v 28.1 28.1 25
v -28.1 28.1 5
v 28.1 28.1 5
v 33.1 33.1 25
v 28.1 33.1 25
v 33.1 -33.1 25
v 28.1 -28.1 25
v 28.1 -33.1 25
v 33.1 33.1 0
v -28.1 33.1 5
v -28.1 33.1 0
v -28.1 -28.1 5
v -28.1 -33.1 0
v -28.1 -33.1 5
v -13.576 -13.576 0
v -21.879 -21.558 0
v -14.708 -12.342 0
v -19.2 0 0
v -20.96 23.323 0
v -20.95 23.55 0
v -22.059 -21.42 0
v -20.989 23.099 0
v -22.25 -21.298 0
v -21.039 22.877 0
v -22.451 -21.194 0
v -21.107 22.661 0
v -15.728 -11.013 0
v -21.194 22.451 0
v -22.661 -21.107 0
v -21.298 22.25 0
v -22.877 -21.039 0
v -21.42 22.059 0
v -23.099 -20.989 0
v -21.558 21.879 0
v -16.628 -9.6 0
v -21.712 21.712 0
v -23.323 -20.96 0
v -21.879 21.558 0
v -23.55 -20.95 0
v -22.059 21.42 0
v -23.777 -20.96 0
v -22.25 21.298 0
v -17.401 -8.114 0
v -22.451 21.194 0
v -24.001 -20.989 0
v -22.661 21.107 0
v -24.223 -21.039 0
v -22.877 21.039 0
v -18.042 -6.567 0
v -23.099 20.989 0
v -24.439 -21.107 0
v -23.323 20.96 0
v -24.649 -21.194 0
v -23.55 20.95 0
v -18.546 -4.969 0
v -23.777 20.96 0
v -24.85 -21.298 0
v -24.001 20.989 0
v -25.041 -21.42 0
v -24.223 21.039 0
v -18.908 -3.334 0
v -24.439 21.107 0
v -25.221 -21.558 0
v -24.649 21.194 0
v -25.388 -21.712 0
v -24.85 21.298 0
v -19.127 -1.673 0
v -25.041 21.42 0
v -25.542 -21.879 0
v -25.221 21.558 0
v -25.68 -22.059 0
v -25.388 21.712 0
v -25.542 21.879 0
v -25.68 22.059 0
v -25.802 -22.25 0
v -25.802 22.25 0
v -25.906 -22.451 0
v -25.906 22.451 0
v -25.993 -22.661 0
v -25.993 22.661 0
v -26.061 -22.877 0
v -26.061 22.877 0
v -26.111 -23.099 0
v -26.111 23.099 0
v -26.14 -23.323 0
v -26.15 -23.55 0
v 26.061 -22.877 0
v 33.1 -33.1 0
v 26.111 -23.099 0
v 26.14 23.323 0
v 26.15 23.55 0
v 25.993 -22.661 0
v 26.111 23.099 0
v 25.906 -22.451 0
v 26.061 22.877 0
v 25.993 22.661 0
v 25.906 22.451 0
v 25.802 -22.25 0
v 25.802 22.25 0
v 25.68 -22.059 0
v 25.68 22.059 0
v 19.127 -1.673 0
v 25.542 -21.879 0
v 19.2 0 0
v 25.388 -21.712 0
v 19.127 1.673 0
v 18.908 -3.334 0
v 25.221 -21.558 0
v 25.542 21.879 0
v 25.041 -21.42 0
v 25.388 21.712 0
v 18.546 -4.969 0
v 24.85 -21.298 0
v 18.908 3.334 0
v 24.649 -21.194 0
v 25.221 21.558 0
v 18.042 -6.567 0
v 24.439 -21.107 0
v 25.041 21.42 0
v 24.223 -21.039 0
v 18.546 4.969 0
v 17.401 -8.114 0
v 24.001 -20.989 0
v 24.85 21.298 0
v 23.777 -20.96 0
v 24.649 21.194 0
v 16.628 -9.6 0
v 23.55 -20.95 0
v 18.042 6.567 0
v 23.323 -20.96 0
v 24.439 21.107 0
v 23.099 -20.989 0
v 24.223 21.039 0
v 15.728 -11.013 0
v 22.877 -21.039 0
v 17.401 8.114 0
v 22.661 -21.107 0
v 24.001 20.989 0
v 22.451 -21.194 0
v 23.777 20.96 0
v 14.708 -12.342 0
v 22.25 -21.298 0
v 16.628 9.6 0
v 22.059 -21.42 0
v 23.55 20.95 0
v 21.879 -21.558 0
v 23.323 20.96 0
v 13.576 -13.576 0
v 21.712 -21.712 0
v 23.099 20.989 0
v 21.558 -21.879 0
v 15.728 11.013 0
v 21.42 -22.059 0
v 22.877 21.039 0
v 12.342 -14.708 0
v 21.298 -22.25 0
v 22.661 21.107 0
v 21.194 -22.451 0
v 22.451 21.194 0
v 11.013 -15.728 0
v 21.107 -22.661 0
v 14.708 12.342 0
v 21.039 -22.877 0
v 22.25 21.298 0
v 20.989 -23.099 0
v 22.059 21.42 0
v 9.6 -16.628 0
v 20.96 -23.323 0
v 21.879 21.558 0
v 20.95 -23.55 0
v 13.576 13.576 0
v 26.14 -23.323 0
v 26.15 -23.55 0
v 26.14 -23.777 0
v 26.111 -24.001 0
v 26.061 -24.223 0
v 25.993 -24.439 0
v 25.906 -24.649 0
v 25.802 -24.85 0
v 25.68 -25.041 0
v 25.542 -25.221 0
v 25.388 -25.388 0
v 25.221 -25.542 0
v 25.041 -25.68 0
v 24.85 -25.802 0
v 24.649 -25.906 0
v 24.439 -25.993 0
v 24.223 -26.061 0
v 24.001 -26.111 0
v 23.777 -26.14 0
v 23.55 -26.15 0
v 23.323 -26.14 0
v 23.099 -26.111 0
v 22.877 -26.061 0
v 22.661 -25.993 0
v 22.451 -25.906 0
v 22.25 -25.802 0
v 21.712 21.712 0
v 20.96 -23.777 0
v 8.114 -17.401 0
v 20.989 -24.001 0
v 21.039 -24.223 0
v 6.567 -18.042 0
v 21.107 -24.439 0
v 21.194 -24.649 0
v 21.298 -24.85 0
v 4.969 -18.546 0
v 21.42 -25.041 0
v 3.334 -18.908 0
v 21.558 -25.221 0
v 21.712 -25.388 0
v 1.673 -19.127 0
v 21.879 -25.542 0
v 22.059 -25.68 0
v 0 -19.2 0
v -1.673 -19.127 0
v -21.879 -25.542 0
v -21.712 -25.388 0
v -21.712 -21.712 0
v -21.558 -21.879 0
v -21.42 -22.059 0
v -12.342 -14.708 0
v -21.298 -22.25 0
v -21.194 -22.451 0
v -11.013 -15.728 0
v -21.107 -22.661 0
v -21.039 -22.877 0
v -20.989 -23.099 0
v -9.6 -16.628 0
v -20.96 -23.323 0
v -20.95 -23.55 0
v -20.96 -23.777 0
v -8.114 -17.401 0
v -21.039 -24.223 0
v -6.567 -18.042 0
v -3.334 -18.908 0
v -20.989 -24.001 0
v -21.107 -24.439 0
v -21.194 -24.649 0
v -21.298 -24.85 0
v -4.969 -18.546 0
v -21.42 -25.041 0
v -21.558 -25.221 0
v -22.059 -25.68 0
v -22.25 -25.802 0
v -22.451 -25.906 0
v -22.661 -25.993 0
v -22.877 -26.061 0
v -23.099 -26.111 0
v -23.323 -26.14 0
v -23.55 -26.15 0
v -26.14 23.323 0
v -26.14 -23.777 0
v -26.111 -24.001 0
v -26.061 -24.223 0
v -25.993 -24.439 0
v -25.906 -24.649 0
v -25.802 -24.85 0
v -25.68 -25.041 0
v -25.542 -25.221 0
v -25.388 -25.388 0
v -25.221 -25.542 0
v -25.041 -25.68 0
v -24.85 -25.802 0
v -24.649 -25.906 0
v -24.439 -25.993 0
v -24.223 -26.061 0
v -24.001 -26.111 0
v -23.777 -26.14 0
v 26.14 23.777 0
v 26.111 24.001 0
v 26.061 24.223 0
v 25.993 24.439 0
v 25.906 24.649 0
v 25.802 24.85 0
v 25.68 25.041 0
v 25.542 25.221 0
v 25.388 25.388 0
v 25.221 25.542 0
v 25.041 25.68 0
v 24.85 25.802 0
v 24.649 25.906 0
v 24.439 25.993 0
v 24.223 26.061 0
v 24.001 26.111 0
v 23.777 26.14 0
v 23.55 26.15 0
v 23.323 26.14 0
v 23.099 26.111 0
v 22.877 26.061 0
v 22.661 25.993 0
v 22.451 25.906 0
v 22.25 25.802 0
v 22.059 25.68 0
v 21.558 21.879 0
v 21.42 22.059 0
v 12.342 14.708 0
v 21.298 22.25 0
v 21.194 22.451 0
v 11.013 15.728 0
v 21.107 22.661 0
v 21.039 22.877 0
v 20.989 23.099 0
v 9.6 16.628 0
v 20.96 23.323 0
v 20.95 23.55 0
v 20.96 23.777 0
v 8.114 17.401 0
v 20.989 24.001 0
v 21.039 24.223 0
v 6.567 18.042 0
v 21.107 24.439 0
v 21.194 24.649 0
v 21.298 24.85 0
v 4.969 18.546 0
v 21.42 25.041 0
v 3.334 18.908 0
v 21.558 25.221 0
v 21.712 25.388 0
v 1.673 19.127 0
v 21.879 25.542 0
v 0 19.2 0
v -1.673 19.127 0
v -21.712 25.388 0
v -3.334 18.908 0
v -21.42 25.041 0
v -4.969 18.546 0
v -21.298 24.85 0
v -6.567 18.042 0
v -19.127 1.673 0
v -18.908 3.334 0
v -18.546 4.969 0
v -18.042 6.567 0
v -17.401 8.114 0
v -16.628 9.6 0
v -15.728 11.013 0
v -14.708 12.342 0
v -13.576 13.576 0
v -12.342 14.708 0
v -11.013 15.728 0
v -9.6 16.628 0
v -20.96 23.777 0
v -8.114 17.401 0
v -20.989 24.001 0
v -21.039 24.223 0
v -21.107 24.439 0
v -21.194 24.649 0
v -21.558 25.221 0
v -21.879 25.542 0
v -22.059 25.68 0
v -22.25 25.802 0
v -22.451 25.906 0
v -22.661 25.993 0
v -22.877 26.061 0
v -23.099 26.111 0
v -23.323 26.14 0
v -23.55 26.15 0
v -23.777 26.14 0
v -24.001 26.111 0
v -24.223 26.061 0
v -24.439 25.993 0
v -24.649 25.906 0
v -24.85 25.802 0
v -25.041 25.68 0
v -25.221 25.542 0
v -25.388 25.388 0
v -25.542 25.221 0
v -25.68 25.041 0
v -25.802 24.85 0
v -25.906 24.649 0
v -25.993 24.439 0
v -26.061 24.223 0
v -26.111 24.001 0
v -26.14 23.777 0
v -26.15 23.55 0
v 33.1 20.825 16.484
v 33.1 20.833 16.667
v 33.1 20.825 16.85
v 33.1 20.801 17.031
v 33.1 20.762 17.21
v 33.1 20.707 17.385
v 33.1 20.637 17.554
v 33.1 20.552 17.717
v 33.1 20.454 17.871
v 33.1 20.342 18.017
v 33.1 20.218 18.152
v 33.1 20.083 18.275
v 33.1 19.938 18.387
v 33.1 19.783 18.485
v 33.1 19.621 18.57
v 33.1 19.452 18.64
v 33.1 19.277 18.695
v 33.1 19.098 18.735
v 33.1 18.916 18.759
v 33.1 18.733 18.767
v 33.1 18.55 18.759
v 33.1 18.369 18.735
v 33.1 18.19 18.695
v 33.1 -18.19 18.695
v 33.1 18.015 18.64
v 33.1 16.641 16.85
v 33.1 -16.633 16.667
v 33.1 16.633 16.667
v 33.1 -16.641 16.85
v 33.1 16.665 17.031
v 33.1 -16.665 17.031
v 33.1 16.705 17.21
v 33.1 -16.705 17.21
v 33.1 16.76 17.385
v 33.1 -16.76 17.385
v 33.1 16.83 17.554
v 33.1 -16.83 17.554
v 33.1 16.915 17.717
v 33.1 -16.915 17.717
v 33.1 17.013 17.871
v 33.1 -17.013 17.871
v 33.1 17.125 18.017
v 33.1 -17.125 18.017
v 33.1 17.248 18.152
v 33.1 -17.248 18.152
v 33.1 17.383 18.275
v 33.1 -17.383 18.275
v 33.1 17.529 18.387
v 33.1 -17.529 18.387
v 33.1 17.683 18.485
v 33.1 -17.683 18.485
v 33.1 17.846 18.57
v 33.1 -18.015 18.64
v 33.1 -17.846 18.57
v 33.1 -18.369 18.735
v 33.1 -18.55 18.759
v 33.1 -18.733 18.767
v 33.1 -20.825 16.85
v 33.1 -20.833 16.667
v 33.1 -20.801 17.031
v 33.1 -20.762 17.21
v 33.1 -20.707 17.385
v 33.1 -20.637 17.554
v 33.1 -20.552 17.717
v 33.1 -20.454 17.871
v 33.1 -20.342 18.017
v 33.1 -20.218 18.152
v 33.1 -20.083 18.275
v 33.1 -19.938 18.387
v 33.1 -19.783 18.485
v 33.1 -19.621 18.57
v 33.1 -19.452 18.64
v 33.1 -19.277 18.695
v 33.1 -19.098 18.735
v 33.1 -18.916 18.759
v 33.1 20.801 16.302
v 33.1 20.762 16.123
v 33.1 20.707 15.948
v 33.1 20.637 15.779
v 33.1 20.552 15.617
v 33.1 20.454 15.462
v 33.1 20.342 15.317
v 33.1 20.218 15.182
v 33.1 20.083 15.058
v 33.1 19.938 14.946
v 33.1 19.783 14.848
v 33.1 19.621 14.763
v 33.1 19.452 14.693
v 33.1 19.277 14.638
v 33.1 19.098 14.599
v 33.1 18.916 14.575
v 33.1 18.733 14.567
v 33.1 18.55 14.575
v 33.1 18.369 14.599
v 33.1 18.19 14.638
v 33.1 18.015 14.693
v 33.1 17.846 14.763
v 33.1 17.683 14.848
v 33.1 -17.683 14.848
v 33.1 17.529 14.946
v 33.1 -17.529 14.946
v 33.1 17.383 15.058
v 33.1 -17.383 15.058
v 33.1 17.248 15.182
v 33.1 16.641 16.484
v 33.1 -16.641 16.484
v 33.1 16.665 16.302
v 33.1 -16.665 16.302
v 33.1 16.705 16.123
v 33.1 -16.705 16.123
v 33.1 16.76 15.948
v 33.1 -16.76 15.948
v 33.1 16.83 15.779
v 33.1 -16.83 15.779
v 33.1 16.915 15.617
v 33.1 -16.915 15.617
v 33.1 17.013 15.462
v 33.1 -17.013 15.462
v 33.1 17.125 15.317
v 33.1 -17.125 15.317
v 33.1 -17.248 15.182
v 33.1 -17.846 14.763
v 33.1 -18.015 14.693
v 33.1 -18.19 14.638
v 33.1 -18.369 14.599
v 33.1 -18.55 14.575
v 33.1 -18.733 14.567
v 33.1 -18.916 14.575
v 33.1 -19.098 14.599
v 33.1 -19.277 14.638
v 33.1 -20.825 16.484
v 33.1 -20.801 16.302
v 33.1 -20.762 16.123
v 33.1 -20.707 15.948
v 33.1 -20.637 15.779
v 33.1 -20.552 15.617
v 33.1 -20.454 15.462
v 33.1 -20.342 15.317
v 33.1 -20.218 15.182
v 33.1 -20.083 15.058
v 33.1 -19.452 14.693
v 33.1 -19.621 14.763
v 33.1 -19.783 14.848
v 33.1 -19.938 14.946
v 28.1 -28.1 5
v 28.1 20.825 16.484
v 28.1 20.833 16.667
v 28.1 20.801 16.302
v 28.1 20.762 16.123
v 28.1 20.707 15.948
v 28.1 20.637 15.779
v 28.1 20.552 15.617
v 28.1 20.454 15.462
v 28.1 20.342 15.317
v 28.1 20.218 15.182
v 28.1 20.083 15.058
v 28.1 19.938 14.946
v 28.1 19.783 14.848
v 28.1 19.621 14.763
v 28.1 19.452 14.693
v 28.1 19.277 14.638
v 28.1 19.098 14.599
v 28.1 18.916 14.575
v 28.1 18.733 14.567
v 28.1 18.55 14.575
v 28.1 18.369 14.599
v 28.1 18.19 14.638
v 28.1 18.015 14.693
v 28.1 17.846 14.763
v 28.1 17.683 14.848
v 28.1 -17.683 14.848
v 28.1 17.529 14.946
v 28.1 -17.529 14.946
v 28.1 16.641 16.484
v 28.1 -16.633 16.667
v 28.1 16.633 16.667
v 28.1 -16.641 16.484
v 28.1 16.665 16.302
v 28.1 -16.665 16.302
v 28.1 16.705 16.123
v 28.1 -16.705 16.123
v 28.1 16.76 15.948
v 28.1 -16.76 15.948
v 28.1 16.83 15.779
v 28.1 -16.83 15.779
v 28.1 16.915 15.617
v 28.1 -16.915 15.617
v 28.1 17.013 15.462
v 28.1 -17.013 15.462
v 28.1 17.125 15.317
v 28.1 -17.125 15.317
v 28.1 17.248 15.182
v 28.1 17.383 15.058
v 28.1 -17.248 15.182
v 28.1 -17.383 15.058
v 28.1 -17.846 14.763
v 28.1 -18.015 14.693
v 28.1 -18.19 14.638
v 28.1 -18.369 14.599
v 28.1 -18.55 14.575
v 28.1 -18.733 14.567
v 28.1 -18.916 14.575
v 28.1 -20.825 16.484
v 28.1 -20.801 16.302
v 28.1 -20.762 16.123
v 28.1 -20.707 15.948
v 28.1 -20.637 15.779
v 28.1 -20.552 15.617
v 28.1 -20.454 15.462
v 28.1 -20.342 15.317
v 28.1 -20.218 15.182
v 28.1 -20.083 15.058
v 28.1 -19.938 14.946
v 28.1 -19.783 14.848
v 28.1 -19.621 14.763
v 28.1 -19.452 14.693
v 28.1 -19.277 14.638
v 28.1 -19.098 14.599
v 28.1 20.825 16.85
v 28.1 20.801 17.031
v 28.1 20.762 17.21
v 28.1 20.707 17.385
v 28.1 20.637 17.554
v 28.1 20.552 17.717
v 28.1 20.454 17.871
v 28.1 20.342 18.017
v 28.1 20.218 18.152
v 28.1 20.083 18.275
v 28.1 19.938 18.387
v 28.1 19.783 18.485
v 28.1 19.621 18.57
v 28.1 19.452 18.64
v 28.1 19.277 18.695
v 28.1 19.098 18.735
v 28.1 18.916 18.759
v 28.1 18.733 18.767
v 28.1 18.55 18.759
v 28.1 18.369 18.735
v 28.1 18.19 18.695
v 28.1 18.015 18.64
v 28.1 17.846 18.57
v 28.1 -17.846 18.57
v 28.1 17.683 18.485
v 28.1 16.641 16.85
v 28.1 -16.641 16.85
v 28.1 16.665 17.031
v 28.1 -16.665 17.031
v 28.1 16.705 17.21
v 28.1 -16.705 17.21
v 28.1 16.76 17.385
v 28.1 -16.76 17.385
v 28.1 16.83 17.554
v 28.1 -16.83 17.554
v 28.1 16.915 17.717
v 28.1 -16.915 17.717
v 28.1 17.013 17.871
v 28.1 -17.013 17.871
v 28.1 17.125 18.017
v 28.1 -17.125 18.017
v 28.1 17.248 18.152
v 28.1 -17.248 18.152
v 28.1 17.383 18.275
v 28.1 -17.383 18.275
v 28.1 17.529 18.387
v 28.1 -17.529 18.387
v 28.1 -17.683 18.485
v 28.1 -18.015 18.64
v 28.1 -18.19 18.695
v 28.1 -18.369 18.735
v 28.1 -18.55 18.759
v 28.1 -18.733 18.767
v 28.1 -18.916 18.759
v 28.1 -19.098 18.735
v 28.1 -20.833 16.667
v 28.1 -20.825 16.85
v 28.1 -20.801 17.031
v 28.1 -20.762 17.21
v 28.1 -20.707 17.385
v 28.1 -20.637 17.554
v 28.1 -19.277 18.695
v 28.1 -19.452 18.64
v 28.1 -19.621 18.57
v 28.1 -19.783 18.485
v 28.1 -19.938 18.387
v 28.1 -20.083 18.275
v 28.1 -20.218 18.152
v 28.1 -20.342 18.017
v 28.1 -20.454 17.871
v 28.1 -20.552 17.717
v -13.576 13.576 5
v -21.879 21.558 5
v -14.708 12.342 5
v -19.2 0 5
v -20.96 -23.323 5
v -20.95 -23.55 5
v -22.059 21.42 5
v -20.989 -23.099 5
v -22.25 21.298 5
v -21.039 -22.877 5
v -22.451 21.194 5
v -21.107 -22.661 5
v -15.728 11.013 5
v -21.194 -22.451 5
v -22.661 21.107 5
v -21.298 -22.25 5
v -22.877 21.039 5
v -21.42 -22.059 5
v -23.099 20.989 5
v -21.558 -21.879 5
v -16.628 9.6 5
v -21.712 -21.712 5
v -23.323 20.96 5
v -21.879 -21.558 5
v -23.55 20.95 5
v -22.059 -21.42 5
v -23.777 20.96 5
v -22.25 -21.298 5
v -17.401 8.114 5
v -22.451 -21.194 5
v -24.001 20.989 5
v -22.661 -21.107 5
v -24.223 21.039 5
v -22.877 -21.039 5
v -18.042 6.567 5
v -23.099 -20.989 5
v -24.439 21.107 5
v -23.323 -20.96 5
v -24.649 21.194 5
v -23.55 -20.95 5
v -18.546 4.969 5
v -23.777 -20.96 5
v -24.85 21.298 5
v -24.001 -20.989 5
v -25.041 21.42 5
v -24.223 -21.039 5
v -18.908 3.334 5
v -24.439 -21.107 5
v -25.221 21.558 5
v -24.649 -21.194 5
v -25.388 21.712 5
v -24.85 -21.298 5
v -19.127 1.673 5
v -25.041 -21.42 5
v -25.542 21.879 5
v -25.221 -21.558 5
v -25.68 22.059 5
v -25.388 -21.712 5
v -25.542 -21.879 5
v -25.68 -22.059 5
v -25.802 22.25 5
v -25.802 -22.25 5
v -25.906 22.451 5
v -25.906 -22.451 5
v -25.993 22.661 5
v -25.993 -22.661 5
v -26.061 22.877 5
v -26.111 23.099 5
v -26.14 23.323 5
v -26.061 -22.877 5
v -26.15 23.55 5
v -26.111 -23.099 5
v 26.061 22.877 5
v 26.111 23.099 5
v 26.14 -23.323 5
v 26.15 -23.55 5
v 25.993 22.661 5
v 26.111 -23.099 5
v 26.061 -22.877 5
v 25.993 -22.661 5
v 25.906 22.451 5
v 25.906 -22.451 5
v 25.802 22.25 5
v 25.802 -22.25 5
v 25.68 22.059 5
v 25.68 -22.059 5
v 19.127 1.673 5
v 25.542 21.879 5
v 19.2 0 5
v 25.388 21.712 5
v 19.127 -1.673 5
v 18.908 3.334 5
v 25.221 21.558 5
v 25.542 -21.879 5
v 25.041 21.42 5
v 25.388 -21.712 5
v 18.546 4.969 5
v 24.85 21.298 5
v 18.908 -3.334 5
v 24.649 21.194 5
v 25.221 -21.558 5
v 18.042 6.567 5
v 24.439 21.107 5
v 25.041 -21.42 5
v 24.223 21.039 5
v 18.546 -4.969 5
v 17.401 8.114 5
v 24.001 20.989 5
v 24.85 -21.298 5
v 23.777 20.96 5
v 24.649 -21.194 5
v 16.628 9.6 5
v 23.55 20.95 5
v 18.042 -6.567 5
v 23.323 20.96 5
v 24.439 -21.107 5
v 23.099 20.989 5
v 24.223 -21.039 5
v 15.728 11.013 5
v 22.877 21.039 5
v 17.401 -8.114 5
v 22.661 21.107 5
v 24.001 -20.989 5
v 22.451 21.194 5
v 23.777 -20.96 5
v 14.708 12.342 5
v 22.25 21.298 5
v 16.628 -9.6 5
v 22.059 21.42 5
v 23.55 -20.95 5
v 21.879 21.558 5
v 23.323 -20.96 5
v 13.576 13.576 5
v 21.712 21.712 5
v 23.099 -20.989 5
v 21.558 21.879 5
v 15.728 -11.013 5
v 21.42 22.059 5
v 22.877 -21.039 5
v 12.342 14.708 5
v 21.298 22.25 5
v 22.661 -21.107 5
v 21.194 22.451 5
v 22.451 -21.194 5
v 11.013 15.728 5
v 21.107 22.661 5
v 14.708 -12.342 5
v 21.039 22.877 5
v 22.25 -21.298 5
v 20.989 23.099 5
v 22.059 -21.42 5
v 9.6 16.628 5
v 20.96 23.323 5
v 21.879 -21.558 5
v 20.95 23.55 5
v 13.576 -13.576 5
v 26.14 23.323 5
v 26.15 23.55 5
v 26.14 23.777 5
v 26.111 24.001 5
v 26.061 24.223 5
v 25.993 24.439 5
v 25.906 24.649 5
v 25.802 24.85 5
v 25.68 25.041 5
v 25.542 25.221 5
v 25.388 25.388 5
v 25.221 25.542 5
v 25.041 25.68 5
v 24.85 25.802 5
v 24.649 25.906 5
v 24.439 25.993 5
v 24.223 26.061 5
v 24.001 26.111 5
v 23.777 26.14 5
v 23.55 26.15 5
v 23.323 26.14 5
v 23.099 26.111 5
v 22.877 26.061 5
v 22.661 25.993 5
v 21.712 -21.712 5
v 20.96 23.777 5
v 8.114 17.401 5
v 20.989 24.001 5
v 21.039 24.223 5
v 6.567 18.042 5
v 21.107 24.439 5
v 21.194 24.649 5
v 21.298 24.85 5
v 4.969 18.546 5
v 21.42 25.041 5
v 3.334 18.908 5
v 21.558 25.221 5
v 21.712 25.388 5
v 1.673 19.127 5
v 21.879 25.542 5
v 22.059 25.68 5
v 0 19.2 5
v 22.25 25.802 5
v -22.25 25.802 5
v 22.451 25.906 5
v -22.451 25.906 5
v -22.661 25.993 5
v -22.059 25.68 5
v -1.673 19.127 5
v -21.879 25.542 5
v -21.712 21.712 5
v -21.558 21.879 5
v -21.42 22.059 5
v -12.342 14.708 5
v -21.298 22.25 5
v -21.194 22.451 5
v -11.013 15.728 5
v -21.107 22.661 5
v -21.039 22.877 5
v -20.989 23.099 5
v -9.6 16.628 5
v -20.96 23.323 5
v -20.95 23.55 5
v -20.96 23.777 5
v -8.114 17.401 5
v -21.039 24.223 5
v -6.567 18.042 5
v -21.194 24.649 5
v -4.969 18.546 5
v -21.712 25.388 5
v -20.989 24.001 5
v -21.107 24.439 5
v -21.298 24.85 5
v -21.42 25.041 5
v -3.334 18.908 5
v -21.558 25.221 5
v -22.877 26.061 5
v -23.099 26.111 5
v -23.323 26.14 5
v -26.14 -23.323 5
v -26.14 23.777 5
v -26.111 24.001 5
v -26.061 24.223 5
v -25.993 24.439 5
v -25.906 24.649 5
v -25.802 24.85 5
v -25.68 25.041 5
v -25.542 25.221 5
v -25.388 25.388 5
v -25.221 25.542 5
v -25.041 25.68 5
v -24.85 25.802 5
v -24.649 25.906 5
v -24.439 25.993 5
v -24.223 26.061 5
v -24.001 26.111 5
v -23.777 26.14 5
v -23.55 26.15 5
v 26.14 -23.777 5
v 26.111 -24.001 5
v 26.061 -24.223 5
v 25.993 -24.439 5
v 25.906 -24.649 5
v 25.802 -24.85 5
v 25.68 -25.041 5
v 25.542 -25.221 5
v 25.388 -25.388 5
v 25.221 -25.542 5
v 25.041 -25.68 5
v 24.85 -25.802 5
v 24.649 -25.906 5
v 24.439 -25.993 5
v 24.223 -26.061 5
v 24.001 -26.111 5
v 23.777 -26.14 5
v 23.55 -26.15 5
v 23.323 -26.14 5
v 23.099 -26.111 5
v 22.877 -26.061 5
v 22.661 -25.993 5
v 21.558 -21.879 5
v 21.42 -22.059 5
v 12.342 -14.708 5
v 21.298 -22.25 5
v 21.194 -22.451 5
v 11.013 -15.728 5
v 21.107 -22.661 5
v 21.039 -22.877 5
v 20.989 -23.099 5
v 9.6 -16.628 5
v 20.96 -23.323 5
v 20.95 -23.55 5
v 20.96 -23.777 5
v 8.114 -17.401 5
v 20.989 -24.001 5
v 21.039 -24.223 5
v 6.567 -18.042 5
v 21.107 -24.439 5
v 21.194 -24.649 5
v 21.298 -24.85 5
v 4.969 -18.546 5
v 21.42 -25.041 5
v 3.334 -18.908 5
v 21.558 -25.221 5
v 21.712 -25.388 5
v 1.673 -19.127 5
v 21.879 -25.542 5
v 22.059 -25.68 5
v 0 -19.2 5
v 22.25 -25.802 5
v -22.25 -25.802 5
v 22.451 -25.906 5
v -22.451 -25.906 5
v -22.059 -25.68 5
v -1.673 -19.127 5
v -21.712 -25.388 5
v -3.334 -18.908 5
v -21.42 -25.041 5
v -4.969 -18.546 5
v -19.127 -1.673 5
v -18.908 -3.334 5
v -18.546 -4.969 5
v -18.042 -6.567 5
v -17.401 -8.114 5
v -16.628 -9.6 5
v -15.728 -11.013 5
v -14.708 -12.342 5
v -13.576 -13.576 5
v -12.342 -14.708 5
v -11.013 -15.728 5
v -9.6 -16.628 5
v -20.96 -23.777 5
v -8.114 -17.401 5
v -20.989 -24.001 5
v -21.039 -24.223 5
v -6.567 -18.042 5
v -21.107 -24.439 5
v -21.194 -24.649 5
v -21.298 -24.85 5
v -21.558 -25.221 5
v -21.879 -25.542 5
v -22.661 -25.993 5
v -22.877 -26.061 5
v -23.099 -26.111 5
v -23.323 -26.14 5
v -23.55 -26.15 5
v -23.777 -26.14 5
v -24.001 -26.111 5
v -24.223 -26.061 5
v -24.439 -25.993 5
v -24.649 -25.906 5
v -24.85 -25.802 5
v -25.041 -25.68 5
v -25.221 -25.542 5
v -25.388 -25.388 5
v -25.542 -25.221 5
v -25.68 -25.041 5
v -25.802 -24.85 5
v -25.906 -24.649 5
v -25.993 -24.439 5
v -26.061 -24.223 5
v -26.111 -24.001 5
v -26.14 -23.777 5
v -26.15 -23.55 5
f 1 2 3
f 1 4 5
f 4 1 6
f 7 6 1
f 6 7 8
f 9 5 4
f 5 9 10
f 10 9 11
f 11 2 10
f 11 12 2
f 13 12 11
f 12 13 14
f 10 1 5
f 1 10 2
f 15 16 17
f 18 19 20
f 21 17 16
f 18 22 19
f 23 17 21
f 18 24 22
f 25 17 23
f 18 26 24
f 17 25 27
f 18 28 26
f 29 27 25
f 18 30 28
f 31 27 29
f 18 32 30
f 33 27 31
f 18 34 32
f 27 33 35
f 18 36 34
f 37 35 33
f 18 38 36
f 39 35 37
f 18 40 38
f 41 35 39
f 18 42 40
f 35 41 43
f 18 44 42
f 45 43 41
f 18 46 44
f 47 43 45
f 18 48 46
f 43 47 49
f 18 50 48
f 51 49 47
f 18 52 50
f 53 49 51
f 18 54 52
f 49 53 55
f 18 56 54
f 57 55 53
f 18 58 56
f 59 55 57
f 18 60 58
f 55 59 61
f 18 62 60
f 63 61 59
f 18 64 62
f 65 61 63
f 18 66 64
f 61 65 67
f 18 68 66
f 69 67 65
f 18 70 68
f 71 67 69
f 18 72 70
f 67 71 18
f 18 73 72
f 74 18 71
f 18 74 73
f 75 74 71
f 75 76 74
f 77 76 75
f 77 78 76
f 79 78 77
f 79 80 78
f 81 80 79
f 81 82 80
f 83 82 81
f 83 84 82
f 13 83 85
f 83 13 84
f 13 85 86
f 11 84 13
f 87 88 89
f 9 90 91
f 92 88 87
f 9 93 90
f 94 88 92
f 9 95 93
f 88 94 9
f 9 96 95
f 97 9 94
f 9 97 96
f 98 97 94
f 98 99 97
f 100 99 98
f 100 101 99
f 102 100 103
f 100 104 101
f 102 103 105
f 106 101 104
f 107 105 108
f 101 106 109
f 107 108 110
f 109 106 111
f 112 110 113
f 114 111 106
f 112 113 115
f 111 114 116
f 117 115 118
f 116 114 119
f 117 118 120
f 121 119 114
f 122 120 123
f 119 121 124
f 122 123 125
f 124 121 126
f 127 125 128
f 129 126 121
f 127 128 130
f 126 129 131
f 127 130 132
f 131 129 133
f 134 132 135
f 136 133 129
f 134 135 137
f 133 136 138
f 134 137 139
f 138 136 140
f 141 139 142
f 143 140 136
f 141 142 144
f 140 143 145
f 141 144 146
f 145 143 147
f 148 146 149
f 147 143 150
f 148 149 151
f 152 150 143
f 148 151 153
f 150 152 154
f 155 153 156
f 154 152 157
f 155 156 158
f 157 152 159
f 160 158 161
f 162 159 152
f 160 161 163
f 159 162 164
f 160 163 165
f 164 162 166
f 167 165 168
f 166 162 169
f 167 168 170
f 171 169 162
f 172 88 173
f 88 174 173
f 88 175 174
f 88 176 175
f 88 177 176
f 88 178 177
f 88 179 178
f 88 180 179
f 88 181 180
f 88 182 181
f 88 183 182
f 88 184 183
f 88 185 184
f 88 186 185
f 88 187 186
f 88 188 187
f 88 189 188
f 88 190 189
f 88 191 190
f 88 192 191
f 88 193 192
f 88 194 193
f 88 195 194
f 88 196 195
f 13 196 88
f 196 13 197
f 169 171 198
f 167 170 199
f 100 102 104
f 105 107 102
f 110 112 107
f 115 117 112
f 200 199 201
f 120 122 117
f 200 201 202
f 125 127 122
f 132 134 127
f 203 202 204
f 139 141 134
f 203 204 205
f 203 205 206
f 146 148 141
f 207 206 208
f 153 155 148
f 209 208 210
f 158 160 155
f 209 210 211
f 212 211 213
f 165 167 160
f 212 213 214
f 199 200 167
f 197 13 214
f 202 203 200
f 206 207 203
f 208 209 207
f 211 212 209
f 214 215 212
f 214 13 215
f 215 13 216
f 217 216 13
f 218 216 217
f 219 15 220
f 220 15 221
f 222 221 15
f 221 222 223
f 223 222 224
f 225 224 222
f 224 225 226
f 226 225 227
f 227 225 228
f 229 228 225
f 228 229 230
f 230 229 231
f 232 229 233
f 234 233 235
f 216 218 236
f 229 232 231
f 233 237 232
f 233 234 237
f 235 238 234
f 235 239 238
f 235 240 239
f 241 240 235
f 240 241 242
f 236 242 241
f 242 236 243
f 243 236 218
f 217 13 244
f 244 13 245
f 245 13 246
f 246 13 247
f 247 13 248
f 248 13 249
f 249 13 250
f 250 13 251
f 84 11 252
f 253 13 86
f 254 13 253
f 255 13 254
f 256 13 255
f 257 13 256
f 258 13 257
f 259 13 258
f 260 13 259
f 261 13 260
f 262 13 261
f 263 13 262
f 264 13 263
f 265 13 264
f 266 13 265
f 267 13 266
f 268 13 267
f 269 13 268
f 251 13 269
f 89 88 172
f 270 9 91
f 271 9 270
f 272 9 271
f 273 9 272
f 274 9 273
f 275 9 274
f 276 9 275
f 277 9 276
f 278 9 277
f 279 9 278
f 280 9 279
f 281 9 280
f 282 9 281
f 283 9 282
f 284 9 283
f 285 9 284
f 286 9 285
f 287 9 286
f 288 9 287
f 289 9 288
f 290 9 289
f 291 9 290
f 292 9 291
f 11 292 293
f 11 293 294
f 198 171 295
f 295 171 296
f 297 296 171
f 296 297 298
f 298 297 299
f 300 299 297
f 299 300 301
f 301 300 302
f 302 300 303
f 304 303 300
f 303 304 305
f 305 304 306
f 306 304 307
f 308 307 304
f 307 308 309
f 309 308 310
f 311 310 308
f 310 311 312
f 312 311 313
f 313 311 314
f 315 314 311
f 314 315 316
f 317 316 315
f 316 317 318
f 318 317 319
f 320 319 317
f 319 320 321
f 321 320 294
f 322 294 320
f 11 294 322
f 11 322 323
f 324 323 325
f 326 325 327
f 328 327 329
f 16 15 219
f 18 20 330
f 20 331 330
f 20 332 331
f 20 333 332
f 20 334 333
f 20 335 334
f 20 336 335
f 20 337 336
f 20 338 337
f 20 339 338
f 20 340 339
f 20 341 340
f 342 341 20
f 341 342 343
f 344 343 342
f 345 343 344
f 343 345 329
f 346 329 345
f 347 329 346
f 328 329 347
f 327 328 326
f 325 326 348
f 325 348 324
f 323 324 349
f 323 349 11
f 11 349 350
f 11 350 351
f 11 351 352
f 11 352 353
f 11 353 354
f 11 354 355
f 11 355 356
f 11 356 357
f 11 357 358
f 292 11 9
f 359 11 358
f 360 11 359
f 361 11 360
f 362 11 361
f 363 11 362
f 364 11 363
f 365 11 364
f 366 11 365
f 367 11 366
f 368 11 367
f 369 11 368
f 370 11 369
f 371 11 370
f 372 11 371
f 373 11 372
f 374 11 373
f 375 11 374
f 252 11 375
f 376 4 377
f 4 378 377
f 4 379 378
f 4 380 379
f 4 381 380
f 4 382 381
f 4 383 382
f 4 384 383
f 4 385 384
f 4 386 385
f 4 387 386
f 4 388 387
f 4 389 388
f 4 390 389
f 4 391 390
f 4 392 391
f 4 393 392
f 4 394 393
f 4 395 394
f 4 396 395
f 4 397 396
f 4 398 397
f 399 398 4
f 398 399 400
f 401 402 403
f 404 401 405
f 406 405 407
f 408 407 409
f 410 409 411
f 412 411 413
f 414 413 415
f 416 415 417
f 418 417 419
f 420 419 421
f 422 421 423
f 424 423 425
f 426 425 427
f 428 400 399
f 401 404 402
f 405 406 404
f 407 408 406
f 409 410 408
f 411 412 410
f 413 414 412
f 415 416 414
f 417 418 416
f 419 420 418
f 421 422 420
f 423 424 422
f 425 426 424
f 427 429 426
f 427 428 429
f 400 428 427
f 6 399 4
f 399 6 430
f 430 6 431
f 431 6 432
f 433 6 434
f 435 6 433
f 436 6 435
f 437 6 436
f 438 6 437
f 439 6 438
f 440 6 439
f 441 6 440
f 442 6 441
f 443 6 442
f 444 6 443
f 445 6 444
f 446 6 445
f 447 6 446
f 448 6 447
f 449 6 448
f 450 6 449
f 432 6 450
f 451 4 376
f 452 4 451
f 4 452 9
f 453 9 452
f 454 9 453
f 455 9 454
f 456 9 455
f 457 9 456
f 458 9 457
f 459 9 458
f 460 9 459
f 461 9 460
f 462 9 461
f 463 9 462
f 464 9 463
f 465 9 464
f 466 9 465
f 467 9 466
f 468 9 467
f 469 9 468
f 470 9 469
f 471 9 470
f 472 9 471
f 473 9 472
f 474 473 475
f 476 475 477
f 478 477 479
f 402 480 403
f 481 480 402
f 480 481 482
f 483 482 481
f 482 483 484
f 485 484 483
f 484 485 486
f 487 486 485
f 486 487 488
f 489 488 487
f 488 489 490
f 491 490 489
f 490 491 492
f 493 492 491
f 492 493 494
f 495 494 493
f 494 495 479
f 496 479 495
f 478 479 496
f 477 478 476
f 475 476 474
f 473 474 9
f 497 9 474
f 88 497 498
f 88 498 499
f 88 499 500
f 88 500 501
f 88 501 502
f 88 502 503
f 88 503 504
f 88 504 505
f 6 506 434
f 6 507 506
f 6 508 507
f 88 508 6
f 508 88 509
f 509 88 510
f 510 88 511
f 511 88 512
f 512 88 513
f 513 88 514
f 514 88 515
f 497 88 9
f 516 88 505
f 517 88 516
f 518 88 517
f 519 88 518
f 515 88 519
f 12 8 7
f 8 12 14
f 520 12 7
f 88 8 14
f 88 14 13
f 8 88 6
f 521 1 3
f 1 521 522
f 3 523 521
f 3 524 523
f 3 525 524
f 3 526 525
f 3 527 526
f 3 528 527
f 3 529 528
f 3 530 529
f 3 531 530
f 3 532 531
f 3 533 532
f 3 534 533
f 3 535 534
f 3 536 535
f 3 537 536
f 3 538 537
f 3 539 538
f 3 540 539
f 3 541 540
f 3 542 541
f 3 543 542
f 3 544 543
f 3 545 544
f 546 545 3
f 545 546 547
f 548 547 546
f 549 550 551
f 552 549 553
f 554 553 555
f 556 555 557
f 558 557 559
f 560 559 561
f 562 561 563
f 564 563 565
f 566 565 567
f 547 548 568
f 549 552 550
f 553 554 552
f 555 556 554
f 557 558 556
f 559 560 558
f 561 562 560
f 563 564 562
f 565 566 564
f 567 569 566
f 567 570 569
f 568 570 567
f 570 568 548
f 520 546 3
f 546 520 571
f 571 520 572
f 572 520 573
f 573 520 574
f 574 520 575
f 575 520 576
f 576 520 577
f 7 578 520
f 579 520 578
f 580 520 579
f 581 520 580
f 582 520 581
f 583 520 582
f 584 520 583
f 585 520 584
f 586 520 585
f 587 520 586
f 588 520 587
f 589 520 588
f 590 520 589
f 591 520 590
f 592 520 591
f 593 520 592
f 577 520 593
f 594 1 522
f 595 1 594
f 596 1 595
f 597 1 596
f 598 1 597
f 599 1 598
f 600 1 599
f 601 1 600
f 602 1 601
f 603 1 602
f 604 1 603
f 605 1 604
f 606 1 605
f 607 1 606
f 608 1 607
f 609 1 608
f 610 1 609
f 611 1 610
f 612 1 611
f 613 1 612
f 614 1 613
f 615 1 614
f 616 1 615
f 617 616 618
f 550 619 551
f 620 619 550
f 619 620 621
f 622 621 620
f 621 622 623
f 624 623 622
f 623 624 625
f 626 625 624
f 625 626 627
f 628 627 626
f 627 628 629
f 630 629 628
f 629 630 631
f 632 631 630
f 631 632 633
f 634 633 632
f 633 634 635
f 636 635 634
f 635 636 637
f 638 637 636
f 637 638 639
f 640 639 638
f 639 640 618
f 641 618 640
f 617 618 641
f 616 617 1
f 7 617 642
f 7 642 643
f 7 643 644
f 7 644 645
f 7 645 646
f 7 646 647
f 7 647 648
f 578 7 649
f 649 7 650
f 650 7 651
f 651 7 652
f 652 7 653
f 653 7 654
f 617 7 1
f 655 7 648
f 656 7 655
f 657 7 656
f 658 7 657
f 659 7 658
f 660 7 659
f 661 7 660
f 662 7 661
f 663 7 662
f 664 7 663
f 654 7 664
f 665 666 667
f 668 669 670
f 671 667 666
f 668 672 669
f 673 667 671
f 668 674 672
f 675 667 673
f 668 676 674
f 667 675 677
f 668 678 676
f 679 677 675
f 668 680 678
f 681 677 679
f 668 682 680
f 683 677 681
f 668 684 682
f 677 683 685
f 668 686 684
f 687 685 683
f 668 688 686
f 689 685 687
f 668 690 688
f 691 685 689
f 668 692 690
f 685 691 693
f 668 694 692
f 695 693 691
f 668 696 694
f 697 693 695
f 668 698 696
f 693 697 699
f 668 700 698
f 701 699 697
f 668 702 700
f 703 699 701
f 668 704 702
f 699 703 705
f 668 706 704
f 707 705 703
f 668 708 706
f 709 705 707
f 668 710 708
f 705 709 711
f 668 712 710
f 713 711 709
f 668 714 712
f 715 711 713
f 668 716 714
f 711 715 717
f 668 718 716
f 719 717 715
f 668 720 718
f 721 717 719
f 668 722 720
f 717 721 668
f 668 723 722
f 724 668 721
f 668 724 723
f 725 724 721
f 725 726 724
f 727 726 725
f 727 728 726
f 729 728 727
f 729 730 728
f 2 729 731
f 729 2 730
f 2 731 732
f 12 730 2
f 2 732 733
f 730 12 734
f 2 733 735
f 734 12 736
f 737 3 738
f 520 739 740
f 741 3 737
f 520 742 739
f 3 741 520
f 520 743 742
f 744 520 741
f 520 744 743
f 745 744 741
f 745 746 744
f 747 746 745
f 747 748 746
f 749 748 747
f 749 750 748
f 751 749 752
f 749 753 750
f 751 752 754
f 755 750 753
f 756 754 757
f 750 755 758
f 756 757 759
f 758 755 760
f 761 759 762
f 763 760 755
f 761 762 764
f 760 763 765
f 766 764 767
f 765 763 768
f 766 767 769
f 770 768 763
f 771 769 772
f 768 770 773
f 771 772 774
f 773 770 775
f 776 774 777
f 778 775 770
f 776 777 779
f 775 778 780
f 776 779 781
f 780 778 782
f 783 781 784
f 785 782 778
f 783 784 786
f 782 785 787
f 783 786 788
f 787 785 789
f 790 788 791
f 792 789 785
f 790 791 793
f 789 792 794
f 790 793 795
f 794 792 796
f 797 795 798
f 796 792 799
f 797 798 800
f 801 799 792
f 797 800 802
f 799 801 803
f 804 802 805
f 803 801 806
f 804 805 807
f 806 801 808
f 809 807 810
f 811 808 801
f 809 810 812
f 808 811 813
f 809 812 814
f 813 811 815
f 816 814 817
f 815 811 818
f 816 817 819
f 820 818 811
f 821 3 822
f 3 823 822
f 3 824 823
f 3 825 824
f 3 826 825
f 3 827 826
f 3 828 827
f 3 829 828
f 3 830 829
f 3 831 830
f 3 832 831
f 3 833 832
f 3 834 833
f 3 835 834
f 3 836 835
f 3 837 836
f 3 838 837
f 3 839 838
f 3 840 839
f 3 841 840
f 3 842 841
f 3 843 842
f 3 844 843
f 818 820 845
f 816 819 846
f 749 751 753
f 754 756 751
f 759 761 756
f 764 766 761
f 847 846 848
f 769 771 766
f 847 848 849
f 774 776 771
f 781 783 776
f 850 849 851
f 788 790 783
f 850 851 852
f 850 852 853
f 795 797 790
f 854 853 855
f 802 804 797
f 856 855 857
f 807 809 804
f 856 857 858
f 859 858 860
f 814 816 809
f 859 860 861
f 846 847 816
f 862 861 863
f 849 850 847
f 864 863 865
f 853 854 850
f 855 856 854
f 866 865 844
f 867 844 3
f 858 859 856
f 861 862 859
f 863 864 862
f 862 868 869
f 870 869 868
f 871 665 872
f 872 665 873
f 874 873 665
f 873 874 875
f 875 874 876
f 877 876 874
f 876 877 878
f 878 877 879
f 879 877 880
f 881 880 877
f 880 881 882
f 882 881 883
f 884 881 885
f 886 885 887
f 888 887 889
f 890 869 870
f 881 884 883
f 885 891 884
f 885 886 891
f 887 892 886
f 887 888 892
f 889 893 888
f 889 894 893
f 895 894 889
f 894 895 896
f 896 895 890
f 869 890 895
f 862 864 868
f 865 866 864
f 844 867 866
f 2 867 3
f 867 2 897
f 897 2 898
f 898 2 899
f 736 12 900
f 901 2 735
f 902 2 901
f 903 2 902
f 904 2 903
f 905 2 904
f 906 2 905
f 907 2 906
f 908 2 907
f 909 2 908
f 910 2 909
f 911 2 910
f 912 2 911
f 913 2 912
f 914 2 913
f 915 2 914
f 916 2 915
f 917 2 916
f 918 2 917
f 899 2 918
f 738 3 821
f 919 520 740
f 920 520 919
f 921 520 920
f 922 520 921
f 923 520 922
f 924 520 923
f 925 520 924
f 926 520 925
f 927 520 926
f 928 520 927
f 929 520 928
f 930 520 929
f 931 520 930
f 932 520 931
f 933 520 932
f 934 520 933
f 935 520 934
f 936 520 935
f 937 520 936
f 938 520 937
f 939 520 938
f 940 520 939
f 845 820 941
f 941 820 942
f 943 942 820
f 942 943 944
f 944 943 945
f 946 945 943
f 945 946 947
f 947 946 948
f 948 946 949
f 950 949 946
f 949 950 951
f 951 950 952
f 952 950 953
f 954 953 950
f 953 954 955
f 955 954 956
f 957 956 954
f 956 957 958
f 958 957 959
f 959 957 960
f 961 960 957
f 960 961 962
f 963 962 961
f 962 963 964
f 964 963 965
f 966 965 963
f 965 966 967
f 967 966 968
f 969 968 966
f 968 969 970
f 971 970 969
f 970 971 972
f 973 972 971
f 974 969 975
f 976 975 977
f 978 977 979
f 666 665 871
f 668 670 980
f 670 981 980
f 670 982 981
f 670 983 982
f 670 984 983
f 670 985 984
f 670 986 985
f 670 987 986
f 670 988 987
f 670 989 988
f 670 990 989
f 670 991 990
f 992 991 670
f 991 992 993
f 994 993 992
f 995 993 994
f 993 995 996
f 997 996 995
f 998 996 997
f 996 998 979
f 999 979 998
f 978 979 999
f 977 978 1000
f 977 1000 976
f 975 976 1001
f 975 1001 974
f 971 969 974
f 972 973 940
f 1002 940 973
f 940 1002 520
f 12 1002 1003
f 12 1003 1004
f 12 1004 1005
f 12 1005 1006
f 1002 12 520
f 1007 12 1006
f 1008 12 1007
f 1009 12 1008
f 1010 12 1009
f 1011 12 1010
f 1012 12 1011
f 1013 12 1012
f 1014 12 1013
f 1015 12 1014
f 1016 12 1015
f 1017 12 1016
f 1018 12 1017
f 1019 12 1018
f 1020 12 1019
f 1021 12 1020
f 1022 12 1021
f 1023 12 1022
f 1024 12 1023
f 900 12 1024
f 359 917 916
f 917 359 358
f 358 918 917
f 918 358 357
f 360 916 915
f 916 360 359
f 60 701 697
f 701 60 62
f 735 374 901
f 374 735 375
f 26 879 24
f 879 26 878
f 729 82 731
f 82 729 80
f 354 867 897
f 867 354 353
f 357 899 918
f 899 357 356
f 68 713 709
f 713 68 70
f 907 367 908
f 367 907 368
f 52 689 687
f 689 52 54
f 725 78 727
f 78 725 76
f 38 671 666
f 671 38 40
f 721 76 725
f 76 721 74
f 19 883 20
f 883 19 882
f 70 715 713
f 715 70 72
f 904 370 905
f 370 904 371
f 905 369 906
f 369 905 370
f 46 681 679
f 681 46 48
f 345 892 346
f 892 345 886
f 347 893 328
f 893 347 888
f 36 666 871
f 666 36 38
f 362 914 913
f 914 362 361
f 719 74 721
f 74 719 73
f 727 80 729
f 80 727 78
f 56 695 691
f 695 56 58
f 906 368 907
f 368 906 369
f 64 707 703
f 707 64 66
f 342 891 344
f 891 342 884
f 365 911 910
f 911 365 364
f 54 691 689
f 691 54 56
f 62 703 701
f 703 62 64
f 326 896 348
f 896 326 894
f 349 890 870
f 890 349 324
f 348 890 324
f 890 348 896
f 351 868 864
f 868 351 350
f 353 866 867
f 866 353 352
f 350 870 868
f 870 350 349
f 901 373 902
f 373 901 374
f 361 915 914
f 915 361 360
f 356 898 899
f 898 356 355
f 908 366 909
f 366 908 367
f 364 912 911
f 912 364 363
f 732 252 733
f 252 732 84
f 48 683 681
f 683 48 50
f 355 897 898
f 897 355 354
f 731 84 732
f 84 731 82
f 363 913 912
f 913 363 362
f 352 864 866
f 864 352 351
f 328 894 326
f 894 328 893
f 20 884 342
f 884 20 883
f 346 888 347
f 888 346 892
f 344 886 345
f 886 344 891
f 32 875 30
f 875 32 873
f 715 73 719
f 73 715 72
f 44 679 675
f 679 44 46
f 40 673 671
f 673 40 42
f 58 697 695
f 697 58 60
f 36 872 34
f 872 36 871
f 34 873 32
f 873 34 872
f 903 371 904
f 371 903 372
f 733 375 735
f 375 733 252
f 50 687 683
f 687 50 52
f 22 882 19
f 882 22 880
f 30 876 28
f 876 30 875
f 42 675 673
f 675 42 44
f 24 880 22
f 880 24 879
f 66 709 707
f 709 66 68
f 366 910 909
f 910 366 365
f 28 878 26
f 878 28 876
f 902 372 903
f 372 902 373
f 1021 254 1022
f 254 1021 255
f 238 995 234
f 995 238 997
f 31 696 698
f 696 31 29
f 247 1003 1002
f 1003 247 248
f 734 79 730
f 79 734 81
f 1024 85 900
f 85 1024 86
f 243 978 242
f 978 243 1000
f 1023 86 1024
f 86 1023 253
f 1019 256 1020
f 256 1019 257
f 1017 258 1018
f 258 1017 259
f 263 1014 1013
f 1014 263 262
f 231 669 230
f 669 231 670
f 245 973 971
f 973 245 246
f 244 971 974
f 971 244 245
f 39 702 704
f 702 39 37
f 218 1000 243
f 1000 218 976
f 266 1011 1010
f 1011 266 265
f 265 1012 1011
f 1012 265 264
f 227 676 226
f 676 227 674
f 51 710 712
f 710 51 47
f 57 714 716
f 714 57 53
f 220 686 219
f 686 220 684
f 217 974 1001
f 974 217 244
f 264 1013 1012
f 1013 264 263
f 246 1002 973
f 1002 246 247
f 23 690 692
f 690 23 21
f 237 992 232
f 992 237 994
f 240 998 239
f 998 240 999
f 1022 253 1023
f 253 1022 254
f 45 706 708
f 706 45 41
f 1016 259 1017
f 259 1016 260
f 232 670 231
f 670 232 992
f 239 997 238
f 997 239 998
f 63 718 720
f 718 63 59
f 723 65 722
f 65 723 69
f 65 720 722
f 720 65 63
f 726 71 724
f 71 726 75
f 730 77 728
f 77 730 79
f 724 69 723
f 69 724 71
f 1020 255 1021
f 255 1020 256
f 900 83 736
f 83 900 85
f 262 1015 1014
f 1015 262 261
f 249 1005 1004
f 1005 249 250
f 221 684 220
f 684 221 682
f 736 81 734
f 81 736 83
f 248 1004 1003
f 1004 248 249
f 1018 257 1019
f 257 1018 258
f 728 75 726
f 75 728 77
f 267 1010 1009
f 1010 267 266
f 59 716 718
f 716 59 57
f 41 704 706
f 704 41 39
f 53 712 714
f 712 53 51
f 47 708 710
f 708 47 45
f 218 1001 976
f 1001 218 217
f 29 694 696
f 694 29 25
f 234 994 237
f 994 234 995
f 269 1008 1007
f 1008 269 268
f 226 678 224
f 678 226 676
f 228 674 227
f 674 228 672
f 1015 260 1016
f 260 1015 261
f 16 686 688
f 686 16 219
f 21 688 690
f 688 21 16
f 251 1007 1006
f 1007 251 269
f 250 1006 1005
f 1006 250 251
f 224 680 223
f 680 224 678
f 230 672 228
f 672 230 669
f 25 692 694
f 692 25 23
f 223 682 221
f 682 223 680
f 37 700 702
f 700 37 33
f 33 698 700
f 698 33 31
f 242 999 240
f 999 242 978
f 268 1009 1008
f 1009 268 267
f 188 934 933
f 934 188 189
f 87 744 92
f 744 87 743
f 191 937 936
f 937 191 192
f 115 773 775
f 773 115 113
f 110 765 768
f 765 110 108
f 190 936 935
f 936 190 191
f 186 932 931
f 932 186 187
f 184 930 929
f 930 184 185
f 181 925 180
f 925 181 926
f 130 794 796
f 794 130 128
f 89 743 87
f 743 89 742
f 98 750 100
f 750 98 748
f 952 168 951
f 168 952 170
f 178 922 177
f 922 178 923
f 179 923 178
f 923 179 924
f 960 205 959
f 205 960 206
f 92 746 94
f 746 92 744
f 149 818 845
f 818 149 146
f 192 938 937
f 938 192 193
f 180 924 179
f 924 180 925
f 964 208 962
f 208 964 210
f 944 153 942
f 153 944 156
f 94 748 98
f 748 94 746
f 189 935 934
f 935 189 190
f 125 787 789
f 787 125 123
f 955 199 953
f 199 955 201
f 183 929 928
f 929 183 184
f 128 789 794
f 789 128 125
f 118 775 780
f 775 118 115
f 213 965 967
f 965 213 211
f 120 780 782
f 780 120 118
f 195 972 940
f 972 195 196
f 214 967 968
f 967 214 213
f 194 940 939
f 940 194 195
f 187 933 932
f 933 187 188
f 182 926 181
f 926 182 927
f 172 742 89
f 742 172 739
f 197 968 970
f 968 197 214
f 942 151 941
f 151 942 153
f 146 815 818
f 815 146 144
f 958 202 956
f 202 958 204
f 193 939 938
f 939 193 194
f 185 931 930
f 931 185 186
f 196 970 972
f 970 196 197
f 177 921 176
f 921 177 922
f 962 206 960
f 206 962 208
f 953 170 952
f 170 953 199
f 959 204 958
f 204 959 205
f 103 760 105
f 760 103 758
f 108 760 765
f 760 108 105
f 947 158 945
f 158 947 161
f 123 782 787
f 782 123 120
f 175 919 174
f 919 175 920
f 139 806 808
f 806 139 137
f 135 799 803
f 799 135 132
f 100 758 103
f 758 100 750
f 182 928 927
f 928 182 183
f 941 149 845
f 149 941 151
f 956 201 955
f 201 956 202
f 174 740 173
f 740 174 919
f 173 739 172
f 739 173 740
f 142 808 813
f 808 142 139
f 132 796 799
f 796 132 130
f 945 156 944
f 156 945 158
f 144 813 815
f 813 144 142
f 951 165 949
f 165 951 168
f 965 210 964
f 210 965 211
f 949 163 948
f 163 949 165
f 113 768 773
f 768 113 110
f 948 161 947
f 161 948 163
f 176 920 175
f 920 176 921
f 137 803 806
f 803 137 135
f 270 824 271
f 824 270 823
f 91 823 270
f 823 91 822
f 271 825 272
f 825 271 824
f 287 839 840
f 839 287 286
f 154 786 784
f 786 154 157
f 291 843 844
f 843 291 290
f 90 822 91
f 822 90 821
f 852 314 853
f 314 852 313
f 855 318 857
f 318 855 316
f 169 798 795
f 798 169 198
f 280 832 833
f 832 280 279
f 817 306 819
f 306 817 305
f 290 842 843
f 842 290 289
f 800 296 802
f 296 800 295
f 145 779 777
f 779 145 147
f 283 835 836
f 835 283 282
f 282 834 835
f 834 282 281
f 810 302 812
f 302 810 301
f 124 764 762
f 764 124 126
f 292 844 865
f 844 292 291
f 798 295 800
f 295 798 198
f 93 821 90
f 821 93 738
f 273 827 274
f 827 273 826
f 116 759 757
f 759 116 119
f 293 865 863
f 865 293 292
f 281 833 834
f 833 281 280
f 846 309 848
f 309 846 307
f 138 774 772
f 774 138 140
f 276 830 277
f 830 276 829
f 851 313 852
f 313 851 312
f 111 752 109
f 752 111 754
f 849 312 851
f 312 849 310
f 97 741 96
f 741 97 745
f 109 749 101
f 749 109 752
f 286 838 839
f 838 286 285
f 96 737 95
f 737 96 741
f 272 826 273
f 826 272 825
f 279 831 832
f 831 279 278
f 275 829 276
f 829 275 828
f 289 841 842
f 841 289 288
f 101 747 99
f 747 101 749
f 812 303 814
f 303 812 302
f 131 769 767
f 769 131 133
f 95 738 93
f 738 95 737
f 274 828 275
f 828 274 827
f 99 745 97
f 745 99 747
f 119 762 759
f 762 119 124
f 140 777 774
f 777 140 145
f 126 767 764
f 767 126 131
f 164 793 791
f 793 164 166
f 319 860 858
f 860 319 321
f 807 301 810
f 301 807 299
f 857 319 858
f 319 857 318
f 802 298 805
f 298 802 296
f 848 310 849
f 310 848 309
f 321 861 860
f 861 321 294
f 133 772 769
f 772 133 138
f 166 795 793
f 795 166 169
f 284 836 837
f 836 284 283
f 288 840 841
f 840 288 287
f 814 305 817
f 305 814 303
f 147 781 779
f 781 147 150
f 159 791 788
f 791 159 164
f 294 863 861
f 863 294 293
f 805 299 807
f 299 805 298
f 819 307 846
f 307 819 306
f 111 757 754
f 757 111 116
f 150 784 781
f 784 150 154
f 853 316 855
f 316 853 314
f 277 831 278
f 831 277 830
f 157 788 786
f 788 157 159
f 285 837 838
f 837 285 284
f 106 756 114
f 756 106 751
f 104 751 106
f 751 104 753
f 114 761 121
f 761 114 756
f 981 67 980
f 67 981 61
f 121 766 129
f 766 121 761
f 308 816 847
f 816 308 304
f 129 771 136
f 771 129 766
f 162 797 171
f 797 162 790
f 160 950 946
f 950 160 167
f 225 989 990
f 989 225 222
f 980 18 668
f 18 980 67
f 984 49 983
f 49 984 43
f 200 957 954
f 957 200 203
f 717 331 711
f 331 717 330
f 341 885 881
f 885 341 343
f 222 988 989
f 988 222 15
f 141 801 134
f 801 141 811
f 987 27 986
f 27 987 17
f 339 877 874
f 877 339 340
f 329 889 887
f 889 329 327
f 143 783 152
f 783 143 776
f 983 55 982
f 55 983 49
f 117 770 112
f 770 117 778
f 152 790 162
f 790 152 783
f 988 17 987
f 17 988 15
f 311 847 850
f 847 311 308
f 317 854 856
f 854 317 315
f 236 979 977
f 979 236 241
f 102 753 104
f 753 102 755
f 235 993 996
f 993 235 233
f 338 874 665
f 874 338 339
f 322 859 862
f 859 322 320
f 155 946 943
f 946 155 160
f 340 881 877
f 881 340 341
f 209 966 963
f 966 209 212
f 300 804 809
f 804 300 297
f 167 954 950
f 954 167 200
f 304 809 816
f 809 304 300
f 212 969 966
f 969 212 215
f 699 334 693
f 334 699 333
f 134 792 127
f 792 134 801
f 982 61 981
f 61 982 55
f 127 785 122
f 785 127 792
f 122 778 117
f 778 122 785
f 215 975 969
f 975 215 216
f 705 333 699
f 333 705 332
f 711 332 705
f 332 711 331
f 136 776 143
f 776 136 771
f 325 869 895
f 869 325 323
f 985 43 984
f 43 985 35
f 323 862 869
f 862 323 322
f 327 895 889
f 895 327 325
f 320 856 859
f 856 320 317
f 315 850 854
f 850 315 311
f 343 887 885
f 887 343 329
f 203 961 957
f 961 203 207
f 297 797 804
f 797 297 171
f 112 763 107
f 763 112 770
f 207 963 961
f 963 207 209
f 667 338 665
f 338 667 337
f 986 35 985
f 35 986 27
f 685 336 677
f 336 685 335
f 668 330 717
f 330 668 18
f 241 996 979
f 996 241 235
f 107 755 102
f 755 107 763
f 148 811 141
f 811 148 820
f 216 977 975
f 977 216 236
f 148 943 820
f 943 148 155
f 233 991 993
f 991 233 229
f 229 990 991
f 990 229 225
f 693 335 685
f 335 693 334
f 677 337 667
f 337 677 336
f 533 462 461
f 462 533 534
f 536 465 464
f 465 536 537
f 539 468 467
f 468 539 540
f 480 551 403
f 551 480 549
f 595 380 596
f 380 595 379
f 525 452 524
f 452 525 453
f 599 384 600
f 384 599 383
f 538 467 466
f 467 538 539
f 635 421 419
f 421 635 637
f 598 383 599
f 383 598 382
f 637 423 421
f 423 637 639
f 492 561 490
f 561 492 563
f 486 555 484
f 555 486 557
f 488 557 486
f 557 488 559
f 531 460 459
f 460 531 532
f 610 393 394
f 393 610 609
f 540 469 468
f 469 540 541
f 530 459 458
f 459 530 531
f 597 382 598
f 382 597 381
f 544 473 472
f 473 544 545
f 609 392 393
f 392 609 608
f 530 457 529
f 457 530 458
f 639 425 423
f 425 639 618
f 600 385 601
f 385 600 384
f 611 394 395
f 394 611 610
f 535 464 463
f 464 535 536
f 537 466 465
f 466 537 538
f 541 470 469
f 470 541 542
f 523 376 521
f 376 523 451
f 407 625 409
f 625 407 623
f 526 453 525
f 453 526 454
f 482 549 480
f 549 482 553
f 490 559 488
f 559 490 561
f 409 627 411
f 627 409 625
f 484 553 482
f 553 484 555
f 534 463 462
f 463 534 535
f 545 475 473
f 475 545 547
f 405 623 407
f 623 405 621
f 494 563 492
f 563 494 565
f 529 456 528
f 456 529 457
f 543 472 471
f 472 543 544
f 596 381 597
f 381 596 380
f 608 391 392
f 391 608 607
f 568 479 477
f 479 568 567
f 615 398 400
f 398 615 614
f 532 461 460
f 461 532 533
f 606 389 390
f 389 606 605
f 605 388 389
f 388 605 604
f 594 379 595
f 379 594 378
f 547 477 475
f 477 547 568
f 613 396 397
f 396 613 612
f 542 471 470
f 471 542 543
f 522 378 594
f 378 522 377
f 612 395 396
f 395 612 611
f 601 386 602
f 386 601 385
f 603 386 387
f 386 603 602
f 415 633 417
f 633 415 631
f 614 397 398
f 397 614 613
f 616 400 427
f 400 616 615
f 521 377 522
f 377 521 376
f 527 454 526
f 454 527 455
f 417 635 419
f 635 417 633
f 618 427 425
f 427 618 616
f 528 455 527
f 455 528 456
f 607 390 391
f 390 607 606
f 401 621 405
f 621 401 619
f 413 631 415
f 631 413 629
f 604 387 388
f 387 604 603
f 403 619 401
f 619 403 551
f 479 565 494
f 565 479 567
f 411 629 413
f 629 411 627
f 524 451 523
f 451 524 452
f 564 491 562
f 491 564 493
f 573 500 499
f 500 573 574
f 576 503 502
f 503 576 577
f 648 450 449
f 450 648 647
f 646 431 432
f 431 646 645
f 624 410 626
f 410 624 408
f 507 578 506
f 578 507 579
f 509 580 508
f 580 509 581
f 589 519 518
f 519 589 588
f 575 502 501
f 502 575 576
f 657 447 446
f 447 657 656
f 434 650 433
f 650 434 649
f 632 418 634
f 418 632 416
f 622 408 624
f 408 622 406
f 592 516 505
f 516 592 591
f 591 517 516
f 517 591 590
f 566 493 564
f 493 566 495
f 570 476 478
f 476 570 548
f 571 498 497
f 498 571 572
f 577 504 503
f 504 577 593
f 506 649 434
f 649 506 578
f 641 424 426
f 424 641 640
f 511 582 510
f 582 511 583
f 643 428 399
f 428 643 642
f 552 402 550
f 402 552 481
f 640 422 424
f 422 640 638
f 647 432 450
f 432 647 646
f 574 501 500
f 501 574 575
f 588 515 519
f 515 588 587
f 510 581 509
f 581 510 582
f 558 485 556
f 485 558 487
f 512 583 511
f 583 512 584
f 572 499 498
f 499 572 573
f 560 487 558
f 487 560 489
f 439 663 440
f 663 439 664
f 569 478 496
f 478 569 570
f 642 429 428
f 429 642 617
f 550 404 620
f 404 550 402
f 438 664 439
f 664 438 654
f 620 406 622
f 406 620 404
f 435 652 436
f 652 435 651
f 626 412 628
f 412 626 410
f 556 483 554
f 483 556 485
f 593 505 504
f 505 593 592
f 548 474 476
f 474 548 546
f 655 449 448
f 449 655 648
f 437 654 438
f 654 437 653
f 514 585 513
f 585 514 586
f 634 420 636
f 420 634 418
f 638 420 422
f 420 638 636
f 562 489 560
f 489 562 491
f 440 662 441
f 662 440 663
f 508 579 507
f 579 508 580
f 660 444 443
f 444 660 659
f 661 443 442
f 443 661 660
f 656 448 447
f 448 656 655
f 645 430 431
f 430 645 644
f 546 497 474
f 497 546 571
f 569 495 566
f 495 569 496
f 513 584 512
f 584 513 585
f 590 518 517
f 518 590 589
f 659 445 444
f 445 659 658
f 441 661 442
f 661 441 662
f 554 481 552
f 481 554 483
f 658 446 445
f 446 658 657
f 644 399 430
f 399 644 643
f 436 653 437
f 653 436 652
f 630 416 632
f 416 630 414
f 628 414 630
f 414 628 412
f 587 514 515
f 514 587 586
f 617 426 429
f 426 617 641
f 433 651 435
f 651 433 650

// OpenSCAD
ThicknessStepper = 5;
WidthStepper = 56.2;
ScrewsStepper = 47.1;
HeightFoot = 25;

//change from stepper to bearing
Stepper=1;

$fn=72;
difference(){
    union(){
translate([WidthStepper/-2, WidthStepper/-2,0])
    cube([WidthStepper,WidthStepper,ThicknessStepper]);
translate([WidthStepper/2, WidthStepper/-2,0])
    cube([5,WidthStepper,HeightFoot]);

for(m=[1,0]){
mirror([0,m,0])side();
}
}

if(Stepper == 1){
//hole for stepper
translate([0,0,-0.1])cylinder(r=19.2, h=ThicknessStepper+0.2);
    
ScrewHoles();
}
else
{
translate([0,0,-0.1])cylinder(r=8, h=ThicknessStepper+0.2);
    
translate([0,0,1])cylinder(r=11.1, h=ThicknessStepper+0.2);    
}





for(i=[1,-1]){
translate([WidthStepper/2-0.1,i*WidthStepper/3,2*HeightFoot/3])
rotate([0,90,0])cylinder(r=2.1, h=ThicknessStepper+0.2);
}
}

module ScrewHoles(){
    for(r=[1:4])
{
    rotate([0,0,90*r])translate([ScrewsStepper/2,ScrewsStepper/2,-0.1])cylinder(r=2.6, h=ThicknessStepper+0.2);
}
}

module side()
{
    hull(){
translate([WidthStepper/-2, (WidthStepper/-2)-ThicknessStepper,0])
cube([WidthStepper, 5,5]);
        
translate([WidthStepper/2, (WidthStepper/-2)-ThicknessStepper,0])
cube([5, ThicknessStepper,HeightFoot]);
    }
}
